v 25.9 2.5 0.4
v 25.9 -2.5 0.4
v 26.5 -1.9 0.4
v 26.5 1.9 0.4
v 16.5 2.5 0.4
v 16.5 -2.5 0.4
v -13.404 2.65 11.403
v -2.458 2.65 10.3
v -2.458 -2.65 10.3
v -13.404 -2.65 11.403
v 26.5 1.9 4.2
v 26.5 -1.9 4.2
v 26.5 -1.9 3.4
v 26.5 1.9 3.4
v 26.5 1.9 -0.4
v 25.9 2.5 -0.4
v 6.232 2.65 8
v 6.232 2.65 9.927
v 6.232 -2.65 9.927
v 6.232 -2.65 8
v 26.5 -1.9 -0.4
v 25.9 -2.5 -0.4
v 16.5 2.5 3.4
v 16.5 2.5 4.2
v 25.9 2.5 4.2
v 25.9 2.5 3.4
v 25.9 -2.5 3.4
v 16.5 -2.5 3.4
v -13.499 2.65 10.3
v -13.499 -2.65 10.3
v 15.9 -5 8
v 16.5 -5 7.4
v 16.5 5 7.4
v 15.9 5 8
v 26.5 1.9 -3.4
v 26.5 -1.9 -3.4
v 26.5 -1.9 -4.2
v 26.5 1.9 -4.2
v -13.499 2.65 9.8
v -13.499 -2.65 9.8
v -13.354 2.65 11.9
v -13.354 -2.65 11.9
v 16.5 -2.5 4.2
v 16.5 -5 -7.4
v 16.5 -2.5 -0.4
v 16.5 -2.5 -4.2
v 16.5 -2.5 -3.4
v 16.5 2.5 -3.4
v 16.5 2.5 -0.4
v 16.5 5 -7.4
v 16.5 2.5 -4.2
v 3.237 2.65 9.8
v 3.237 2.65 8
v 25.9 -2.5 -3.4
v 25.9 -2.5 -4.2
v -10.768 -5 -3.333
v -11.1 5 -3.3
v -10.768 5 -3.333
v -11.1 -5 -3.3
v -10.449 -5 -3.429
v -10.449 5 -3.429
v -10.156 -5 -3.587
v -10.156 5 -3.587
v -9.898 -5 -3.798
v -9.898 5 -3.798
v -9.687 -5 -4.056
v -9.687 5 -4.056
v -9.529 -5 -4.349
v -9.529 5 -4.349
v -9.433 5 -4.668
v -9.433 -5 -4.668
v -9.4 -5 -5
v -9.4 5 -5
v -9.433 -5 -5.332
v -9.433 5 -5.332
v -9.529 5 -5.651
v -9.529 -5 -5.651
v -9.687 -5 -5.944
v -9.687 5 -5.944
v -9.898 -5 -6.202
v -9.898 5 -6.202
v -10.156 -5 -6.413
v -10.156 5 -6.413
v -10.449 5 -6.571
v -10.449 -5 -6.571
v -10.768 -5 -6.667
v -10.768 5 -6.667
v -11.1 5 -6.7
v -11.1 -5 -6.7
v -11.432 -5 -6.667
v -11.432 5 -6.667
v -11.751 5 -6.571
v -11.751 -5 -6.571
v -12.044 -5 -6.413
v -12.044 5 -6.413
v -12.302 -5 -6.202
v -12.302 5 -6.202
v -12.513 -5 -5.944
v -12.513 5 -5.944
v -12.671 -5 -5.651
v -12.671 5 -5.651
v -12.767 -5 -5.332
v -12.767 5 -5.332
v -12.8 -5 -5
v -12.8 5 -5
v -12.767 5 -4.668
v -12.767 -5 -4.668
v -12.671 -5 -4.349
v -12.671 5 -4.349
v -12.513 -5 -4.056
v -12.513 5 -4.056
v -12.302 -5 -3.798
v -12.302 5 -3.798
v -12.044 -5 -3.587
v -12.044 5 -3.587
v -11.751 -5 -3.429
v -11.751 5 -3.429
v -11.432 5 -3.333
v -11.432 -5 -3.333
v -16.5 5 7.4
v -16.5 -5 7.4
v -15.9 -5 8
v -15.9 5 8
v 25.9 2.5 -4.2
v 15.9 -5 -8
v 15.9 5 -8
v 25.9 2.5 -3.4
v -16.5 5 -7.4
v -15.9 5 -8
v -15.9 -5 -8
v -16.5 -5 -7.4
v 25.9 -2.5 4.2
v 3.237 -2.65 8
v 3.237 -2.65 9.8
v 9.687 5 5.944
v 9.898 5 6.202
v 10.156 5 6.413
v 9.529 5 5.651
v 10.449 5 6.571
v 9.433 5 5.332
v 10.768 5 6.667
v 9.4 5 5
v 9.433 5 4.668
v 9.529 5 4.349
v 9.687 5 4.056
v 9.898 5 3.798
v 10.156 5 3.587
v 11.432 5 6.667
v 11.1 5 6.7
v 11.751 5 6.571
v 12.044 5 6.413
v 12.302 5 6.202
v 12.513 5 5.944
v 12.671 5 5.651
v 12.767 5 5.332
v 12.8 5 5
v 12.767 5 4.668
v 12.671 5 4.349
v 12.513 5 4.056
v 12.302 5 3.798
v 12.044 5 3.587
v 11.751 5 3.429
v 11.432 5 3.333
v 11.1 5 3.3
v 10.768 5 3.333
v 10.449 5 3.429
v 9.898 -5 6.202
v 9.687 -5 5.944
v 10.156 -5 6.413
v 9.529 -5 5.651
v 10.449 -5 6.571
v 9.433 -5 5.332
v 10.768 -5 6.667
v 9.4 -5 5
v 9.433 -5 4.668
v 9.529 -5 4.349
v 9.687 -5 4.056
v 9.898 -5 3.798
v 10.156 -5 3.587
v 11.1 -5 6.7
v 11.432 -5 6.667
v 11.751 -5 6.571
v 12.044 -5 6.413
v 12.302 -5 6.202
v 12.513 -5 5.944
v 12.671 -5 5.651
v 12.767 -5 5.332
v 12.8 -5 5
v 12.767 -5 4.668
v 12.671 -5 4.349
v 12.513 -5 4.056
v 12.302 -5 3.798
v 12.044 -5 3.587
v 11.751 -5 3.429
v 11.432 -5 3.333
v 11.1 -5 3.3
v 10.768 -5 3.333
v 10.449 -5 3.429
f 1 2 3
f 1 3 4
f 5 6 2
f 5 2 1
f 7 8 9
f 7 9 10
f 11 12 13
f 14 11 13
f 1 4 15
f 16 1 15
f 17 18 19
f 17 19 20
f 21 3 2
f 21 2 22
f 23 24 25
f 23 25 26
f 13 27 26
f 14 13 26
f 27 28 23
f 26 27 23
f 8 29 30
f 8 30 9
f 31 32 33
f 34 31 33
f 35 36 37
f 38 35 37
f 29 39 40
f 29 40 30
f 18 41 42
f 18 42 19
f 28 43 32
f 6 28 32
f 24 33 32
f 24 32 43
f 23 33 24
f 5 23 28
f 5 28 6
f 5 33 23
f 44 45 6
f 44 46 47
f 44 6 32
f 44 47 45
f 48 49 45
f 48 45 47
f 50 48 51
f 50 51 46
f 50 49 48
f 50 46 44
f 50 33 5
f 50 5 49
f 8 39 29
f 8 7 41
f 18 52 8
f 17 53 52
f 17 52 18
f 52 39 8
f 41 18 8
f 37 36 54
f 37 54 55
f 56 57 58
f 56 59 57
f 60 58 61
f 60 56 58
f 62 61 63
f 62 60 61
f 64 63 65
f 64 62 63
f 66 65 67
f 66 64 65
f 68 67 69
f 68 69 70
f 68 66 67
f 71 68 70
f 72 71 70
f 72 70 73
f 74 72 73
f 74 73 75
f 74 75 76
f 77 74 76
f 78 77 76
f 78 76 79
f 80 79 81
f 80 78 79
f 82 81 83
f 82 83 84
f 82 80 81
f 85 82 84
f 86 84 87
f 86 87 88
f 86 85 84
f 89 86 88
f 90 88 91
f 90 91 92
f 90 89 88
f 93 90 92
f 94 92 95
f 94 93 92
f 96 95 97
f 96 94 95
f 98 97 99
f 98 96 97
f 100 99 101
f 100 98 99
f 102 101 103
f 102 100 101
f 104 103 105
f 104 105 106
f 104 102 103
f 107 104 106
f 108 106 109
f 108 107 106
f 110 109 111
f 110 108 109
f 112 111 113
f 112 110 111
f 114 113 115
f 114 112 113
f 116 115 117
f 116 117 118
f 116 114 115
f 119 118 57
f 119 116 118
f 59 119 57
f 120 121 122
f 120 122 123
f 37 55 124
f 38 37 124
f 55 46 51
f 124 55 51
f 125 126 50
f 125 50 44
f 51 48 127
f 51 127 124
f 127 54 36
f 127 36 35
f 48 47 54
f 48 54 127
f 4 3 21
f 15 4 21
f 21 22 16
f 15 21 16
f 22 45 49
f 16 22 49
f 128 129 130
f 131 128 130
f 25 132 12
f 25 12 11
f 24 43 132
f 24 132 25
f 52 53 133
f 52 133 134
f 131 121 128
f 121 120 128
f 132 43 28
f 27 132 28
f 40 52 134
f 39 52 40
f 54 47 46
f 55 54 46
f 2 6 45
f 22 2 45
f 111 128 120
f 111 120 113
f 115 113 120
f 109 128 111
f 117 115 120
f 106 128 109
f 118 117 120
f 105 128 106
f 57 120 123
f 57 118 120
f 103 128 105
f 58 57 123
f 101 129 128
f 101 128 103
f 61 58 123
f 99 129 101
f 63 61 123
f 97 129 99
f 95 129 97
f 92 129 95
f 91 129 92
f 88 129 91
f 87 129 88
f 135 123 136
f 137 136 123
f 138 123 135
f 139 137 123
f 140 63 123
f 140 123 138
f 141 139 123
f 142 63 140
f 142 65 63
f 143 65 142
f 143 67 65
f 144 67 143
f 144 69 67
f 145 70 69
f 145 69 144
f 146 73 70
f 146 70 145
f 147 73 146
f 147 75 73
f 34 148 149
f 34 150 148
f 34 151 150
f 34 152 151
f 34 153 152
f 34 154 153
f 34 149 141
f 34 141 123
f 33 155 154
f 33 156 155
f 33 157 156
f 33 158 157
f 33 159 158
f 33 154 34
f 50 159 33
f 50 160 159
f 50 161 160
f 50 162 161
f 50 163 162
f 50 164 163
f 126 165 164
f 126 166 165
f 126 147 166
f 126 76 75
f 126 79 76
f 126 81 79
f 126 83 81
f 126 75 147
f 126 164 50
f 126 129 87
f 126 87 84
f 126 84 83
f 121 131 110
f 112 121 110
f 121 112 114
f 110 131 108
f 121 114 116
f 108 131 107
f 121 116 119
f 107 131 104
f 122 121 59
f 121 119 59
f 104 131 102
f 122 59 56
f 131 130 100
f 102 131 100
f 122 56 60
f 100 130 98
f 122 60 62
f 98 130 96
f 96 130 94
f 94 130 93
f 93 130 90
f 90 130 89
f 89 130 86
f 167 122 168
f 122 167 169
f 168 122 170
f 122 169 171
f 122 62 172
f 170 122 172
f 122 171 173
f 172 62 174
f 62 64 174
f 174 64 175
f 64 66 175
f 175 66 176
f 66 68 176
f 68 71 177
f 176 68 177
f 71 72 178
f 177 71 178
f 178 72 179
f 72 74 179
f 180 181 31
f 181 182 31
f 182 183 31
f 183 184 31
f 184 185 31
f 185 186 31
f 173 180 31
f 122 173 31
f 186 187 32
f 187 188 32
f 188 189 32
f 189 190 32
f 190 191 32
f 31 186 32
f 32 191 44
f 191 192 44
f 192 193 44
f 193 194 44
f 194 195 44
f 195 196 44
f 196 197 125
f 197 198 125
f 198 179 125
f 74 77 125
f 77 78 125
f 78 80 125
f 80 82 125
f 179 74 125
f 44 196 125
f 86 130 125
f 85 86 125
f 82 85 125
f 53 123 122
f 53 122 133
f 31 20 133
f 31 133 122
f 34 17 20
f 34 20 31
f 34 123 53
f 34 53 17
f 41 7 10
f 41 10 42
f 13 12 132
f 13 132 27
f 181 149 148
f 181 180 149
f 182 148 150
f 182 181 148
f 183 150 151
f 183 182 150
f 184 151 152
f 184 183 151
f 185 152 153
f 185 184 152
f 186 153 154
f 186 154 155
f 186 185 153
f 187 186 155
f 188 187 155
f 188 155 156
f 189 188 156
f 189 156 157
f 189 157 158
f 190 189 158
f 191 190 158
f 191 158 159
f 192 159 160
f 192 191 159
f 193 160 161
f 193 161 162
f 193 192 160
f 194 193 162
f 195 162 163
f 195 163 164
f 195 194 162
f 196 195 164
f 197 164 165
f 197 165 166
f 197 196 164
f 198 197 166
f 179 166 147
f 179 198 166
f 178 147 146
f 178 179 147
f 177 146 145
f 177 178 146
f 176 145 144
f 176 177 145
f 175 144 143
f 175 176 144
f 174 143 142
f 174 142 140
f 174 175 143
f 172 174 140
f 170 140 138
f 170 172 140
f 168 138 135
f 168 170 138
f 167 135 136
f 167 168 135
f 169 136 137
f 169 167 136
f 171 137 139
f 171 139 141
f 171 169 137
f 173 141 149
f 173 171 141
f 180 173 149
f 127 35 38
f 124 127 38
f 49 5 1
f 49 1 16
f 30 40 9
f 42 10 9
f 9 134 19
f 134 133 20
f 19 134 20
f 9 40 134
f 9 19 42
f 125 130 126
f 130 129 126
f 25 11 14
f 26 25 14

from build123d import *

# Parameters (mm, degrees)
SKETCH_1_W      = 33
SKETCH_1_H      = 16
SKETCH_1_R      = 1.7
EXTRUDE_1_DEPTH = 5
EXTRUDE_2_DEPTH = 2.65
SKETCH_3_W      = 0.8
SKETCH_3_H      = 5
EXTRUDE_3_DEPTH = 10
CHAMFER_1_SIZE  = 0.6


with BuildPart() as part:
    # 草图1 → 凸台-拉伸1 (new, symmetric)
    with BuildSketch(Plane(origin=(0, 0, 0), x_dir=(1, 0, 0), z_dir=(0, 1, 0))):
        Rectangle(SKETCH_1_W, SKETCH_1_H)
        with Locations(Location((-11.1, 5, 0), (0, 0, 270))):
            Circle(SKETCH_1_R, mode=Mode.SUBTRACT)
        with Locations(Location((11.1, -5, 0), (0, 0, 270))):
            Circle(SKETCH_1_R, mode=Mode.SUBTRACT)
    extrude(amount=EXTRUDE_1_DEPTH, both=True)

    # 草图2 → 凸台-拉伸2 (add, symmetric)
    with BuildSketch(Plane(origin=(0, 0, 0), x_dir=(1, 0, 0), z_dir=(0, 1, 0))):
        with BuildLine():
            Line((3.236985687, -9.8), (-13.498945121, -9.8))
            Line((-13.498945121, -9.8), (-13.498945121, -10.3))
            Line((-13.498945121, -10.3), (-2.457771256, -10.3))
            Line((-2.457771256, -10.3), (-13.404349416, -11.402516894))
            Line((-13.404349416, -11.402516894), (-13.354243938, -11.9))
            Line((-13.354243938, -11.9), (6.231752422, -9.92733863))
            Line((6.231752422, -9.92733863), (6.231752422, -4.606941304))
            ThreePointArc((6.231752422, -4.606941304), (4.679221154, -3.232884233), (3.236985687, -4.72229453))
            Line((3.236985687, -4.72229453), (3.236985687, -9.8))
        make_face()
    extrude(amount=EXTRUDE_2_DEPTH, both=True)

    # 草图3 → 凸台-拉伸3 (add)
    with BuildSketch(Plane(origin=(16.5, 0, 0), x_dir=(0, 0, -1), z_dir=(1, 0, 0))):
        with Locations((-3.8, 0)):
            Rectangle(SKETCH_3_W, SKETCH_3_H)
        Rectangle(SKETCH_3_W, SKETCH_3_H)
        with Locations((3.8, 0)):
            Rectangle(SKETCH_3_W, SKETCH_3_H)
    extrude(amount=EXTRUDE_3_DEPTH)

    # 倒角1
    chamfer_1_edges = [part.edges().sort_by_distance(p)[0] for p in [
        (26.5, -2.5, 3.8),
        (26.5, 2.5, 3.8),
        (26.5, -2.5, 0),
        (26.5, 2.5, 0),
        (-16.5, 0, -8),
        (26.5, -2.5, -3.8),
        (16.5, 0, -8),
        (26.5, 2.5, -3.8),
        (16.5, 0, 8),
        (-16.5, 0, 8),
    ]]
    chamfer(chamfer_1_edges, length=CHAMFER_1_SIZE)


solid = part.part
